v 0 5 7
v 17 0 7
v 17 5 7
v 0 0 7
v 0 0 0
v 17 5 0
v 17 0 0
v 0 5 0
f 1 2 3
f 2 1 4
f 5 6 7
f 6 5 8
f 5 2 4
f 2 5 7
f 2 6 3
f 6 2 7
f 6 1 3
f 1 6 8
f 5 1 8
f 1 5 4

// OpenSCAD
// Generated by SolidPython 1.0.1 on 2020-07-29 00:46:56


cube(size = [17, 5, 7]);
/***********************************************
*********      SolidPython code:      **********
************************************************
 
# import packages: SolidPython
from solid import *
from solid.utils import *
from itertools import chain, combinations, permutations


class Resize:

    def __init__(self, scad_file):
        self.scad_file = scad_file
        #self.scad_file = import_scad(scad_file)
        # cone/cylinder param:
        self.r1 = 0
        self.r2 = 0
        self.h = 0
        # rectangular prism param:
        self.w = 0
        self.l = 0
        # ellipse param:
        self.r = 0

    # import OpenScad code (file name corresponds to shape)


    # classify shape + parameters
    def assign(self, param1, param2, param3):
        if self.scad_file == 'cone.scad':
            self.r1 = param1
            self.r2 = param2
            self.h = param3
        elif self.scad_file == 'cylinder.scad':
            self.r1 = param1
            self.r2 = param2
            self.h = param3
        elif self.scad_file == 'rectangularPrism.scad':
            self.h = param1
            self.l = param2
            self.w = param3
        else:
            self.r = param1
            self.h = param2

    # resize parameters
    def iterate(self):
        x = range(3, 20, 2)
        i = 1
        if self.scad_file == 'cone.scad':
            tempList = list(permutations(x, 2))
            for temp in tempList:
                param1 = temp[0]
                param2 = temp[1]
                filepath = 'produced_scad_files/' + 'cone' + str(param1) + '_' + str(param2) + '_' + '.scad'
                scad_render_to_file(cylinder(h=param1, r1=param2, r2=0), filepath)

        elif self.scad_file == 'cylinder.scad':
            tempList = list(permutations(x, 3))
            for temp in tempList:
                param1 = temp[0]
                param2 = temp[1]
                filepath = 'produced_scad_files/' + 'cylinder' + str(param1) + '_' + str(param2) + '_' + '.scad'
                scad_render_to_file(cylinder(h=param1, r1=param2, r2=param2), filepath)

        elif self.scad_file == 'rectangularPrism.scad':
            tempList = list(permutations(x, 3))
            for temp in tempList:
                param1 = temp[0]
                param2 = temp[1]
                param3 = temp[2]
                filepath = 'produced_scad_files/' + 'rectangularPrism' + str(param1) + '_' + str(param2) + '_' + str(
                    param3) + '.scad'
                scad_render_to_file(cube(size=(param1, param2, param3)), filepath)

        elif self.scad_file == 'ellipse.scad':
            tempList = list(permutations(x, 4))
            for temp in tempList:
                param1 = temp[0]
                param2 = temp[1]
                param3 = temp[2]
                param4 = temp[3]
                filepath = 'produced_scad_files/' + 'ellipse' + str(param1) + '_' + str(param2) + '_' + str(param3) + '_' + str(param4) + '.scad'
                scad_render_to_file(scale([param1, param2, param3])(sphere(r=param4)), filepath)

    def render_to_scadfile(self):
        scad_render_to_file(scad, 'example.scad') 
 
************************************************/
